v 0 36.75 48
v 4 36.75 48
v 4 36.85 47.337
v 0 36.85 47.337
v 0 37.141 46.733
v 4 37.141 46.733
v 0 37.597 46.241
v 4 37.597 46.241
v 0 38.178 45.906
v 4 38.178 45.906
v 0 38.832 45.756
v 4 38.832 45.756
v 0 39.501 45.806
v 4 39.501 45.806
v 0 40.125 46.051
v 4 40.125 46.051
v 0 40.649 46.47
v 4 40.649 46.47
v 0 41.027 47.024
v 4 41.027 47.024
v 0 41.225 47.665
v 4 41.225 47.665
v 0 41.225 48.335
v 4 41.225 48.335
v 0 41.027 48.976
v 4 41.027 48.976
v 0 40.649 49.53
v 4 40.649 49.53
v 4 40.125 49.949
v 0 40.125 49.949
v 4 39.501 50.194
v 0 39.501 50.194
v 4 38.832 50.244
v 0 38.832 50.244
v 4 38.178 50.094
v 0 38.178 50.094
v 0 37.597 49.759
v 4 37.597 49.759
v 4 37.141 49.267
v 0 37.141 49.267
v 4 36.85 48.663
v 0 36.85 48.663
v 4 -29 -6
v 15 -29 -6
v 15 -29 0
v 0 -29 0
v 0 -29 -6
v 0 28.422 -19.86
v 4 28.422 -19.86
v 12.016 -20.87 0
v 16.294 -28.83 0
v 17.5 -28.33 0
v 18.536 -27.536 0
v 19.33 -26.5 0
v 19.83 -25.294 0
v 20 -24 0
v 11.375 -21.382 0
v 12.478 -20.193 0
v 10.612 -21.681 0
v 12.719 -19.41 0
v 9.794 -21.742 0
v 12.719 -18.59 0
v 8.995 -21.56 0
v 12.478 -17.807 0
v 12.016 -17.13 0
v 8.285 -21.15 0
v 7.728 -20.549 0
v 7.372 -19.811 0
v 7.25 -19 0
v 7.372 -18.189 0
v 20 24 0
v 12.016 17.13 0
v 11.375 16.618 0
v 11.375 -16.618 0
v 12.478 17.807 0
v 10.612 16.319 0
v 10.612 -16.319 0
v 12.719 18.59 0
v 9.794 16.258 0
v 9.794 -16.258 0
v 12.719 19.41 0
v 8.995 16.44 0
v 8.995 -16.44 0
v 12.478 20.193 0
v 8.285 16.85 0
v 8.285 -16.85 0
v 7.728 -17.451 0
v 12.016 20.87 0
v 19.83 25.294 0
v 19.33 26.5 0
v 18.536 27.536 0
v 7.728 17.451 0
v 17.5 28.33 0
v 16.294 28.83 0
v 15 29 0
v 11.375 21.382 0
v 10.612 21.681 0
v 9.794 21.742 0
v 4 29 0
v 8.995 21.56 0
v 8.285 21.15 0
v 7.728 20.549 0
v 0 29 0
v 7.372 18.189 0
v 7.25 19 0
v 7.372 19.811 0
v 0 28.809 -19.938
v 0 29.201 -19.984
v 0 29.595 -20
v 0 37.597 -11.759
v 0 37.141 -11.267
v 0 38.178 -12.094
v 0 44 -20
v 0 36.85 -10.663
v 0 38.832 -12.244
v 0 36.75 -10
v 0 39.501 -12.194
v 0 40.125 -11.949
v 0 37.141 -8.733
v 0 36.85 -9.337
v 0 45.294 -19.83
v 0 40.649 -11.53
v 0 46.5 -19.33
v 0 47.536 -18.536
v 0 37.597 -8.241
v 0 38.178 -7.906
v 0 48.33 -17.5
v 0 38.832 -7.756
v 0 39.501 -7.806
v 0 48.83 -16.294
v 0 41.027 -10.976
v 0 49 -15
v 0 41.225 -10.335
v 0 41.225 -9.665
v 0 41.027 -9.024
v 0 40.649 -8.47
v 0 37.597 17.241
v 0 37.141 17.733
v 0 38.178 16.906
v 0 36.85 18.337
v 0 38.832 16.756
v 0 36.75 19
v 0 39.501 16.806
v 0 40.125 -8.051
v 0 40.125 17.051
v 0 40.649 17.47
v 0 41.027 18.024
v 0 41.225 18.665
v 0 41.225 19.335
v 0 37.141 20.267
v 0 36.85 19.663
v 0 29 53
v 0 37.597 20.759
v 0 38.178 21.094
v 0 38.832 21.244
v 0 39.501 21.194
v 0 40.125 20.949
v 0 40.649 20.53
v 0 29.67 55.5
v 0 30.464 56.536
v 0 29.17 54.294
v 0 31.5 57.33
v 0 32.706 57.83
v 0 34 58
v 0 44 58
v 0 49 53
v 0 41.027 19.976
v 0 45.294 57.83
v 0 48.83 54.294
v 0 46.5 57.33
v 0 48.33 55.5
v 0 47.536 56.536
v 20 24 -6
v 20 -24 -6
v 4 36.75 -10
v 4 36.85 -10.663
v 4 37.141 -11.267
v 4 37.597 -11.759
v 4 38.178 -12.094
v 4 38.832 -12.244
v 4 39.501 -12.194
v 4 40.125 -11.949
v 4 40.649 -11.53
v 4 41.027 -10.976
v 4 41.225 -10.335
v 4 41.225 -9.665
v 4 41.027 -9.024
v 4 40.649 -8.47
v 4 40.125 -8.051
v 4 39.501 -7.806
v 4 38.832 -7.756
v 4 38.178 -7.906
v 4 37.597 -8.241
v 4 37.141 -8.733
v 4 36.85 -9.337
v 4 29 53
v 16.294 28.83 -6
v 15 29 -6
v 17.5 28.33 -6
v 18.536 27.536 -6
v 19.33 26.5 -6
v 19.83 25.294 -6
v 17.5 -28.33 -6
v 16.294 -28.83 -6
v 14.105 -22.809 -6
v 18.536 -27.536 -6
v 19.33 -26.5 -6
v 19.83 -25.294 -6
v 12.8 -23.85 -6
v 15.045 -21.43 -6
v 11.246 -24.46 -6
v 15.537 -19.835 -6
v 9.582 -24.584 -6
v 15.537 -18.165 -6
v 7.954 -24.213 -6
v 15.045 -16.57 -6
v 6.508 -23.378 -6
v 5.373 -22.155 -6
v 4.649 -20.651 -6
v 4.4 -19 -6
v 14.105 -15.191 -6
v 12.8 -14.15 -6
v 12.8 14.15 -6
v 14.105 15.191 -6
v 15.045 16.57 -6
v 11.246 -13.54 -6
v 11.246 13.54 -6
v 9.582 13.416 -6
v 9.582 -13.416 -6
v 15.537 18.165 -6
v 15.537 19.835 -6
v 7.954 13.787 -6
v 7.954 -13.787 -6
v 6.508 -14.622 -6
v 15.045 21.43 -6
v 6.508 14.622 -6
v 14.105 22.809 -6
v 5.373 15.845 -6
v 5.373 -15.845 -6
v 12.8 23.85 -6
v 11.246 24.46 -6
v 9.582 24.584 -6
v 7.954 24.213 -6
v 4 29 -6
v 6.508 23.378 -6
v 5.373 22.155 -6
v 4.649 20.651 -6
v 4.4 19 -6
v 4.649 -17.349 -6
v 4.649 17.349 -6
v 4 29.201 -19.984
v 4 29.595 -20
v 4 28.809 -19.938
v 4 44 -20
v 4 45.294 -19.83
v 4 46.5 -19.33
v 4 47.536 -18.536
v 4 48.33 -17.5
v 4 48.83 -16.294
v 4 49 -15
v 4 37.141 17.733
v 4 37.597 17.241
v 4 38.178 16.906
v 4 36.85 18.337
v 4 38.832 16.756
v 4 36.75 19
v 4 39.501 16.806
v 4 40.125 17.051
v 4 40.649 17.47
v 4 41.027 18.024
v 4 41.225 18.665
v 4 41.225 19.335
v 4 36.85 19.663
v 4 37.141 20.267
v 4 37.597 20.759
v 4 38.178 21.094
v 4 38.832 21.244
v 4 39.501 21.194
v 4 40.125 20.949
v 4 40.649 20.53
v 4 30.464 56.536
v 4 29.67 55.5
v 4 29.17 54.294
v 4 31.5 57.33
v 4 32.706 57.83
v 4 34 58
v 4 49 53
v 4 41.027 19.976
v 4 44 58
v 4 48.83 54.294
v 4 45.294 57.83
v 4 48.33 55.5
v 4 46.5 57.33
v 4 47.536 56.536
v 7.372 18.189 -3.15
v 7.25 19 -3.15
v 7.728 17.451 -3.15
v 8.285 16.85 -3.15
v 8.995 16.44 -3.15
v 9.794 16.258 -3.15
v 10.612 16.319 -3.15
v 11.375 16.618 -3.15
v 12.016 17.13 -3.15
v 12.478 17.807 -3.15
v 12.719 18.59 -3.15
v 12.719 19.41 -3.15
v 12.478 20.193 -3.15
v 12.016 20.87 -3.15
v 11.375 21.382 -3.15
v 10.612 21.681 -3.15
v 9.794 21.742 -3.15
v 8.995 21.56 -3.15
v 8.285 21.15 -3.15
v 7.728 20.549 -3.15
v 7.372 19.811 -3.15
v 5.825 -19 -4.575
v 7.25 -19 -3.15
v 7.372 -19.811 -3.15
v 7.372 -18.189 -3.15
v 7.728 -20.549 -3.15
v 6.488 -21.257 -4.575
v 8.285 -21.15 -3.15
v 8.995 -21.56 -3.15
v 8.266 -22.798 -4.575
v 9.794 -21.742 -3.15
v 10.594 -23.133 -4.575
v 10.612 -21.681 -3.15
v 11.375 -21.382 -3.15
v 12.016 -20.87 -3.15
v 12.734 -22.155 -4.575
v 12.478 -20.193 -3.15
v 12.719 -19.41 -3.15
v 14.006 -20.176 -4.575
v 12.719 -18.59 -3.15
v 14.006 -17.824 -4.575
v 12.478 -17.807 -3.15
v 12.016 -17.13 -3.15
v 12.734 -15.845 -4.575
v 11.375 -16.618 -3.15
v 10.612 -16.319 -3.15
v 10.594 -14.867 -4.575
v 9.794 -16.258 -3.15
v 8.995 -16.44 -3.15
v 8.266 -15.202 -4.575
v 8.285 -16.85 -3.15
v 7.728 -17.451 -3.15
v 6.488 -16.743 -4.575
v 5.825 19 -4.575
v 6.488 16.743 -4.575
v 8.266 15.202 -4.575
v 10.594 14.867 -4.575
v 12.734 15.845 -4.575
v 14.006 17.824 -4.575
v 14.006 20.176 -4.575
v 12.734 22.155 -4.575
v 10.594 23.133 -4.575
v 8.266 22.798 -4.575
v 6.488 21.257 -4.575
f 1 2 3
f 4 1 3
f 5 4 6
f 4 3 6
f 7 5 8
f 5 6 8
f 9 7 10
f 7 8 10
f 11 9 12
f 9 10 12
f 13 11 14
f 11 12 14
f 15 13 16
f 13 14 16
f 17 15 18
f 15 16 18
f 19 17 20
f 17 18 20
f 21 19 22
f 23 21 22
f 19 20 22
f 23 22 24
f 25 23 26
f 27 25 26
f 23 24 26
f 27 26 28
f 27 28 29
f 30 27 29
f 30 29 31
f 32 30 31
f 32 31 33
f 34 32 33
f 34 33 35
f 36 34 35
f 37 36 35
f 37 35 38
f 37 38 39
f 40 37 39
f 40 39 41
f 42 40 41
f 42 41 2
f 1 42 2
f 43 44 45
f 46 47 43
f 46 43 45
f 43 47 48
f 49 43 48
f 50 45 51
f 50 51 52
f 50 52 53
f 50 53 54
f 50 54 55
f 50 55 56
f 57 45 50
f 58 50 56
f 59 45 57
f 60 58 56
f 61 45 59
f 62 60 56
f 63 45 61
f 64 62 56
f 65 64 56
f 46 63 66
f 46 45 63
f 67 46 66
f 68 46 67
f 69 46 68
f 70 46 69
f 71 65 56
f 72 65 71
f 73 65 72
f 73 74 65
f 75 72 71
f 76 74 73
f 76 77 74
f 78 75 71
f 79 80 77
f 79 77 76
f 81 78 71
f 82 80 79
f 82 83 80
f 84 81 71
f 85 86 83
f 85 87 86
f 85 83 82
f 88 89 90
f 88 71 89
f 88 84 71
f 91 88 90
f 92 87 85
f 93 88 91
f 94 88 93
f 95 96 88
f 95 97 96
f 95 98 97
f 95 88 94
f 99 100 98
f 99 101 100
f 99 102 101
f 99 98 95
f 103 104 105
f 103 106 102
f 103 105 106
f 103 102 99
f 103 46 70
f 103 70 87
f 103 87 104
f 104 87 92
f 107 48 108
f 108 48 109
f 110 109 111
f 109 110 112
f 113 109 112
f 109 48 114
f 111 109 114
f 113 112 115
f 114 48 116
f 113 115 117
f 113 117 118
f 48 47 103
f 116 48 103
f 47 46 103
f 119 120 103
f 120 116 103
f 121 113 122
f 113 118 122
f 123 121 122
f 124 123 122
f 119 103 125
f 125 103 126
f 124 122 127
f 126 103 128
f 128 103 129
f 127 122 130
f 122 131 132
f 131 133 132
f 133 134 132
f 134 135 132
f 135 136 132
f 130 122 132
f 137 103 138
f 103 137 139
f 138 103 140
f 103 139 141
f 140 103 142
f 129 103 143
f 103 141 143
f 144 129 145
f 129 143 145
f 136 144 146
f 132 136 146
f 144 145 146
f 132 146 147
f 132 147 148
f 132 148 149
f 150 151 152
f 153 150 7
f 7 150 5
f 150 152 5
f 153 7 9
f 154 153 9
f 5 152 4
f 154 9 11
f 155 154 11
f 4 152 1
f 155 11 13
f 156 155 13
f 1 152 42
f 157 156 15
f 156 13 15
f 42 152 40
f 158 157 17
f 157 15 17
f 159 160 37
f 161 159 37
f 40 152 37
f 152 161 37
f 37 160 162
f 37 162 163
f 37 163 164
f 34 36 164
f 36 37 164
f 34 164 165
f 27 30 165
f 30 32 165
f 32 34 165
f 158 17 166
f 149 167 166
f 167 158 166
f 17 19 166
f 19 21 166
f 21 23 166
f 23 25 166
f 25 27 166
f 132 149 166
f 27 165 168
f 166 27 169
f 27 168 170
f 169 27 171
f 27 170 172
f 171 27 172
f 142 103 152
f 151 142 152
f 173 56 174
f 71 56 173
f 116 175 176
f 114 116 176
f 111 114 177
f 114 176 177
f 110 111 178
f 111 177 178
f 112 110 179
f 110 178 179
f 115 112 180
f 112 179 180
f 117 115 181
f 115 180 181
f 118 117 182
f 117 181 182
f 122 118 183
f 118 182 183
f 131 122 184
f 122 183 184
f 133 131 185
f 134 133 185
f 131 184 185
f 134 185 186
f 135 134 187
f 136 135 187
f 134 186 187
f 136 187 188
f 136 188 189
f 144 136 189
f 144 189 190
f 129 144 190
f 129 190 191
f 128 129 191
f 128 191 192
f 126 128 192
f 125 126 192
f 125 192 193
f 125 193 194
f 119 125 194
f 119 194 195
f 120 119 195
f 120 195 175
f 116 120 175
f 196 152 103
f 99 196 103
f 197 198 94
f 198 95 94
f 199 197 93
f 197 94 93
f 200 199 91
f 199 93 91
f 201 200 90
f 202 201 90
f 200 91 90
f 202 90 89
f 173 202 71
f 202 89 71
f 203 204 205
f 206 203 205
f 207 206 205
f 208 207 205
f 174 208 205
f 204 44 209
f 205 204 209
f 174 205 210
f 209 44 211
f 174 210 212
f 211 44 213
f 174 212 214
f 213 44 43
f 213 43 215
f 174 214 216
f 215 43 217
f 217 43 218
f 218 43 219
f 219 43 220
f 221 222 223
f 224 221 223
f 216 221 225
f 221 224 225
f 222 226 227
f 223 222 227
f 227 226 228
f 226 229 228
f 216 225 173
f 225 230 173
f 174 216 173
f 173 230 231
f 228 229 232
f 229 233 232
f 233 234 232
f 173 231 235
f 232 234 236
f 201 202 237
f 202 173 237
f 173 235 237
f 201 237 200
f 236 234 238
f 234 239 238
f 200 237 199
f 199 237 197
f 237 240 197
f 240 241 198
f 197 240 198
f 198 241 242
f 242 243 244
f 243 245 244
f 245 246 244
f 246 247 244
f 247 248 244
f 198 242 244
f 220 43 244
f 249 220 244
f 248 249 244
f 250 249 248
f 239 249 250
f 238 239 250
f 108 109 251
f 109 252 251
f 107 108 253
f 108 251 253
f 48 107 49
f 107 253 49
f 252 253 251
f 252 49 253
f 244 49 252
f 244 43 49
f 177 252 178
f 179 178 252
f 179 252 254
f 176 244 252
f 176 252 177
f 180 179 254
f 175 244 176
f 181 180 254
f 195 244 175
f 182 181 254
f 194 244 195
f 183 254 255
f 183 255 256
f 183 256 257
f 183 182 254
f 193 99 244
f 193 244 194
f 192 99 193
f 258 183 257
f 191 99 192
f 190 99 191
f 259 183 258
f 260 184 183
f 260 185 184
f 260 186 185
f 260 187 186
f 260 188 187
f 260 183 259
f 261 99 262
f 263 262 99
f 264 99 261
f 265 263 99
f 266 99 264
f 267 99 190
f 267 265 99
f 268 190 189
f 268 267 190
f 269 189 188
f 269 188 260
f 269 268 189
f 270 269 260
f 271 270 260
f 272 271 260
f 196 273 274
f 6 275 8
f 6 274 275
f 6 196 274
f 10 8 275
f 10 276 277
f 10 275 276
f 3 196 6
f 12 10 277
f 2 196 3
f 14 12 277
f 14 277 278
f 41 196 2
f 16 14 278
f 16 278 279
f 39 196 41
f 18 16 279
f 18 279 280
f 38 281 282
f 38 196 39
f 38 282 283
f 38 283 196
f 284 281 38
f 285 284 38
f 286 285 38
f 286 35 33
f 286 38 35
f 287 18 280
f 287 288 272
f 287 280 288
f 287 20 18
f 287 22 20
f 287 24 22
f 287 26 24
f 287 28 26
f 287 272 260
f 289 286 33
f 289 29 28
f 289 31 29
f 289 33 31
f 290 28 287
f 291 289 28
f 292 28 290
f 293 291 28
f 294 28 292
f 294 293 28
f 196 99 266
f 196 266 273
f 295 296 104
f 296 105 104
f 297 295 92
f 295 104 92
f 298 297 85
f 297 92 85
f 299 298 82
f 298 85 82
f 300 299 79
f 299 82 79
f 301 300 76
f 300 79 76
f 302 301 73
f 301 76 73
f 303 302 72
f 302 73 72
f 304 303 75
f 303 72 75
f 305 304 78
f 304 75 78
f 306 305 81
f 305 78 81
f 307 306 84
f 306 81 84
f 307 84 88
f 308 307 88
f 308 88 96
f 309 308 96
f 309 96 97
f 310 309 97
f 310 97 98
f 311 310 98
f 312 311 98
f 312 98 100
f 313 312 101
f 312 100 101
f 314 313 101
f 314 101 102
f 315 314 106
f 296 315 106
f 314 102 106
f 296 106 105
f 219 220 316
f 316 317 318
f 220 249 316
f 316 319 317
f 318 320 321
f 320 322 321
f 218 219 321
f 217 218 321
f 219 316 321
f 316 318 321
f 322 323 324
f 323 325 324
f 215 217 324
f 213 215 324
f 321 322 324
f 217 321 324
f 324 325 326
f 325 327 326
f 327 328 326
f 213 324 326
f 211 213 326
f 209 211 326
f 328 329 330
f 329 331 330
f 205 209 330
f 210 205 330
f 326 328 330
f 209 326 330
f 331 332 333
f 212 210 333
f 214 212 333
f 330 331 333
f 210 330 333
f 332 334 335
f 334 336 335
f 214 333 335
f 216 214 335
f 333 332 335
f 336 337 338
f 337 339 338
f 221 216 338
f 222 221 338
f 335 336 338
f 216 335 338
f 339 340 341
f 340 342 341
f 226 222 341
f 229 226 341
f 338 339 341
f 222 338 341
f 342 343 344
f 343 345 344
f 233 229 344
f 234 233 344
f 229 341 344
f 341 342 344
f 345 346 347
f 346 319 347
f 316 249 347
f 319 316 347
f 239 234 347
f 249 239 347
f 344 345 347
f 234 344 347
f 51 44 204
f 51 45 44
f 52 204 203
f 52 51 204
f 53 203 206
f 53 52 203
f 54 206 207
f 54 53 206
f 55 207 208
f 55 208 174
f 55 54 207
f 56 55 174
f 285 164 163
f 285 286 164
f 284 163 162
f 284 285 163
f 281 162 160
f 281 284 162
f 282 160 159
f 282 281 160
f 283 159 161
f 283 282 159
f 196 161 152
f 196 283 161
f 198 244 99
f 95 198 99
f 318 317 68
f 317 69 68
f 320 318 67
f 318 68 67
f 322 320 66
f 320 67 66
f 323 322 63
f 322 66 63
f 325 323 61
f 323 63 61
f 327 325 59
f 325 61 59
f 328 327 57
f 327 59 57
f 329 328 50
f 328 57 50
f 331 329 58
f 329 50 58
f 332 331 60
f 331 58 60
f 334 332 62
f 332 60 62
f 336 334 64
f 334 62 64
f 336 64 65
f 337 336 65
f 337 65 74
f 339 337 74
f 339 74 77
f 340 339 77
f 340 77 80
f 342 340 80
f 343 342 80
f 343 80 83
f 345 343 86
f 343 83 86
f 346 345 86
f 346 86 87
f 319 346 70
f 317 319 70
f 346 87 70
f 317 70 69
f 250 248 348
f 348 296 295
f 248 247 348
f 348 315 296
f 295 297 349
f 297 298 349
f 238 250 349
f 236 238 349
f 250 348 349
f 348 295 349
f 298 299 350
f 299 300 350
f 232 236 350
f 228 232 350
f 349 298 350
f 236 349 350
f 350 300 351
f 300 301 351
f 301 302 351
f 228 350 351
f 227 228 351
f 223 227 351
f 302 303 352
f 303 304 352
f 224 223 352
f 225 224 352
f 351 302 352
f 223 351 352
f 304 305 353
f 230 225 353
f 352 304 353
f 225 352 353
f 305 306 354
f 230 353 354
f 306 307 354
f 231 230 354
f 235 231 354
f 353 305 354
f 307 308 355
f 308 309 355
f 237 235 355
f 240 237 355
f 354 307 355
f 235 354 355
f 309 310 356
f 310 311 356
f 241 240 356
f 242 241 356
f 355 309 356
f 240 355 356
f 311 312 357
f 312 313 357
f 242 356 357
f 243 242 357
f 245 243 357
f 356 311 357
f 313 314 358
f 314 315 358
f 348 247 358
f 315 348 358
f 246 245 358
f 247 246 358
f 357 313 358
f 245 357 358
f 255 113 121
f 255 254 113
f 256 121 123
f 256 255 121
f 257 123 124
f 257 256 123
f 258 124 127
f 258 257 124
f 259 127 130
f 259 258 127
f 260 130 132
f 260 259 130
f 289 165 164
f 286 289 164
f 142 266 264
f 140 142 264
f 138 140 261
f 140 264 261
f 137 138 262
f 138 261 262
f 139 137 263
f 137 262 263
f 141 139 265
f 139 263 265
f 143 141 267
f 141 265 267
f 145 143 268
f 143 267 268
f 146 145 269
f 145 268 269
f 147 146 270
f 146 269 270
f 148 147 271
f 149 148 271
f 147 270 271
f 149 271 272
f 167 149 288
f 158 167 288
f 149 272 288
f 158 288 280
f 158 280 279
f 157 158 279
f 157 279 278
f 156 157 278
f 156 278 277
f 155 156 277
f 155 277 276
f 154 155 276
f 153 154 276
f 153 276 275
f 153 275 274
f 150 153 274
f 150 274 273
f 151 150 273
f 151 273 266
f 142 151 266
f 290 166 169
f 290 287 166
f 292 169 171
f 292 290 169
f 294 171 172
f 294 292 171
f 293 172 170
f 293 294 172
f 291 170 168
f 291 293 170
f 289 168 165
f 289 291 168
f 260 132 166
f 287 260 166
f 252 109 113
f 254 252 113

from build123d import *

# Parameters (mm, degrees)
F0_W           = 58
F0_H           = 6
F2_DEPTH       = 20
F3_DEPTH       = 4
F5_D           = 5.5
F5_DEPTH       = 15
F5_CSINK_D     = 11.2
F5_CSINK_ANGLE = 90
F5_TIP         = 1.6523667023
F6_R           = 5
F7_D           = 4.5
F7_DEPTH       = 15
F7_TIP         = 1.3519363928


with BuildPart() as f2:
    # F0 (on Right) → F2 (new body)
    with BuildSketch(Plane.YZ):
        with Locations((0, -3)):
            Rectangle(F0_W, F0_H)
    extrude(amount=F2_DEPTH)

    # F1 (on Right) → F3 (join)
    with BuildSketch(Plane.YZ):
        Polygon((-29, 0), (-29, -6), (29, -20), (49, -20), (49, 58), (29, 58), (29, 0), align=None)
    extrude(amount=F3_DEPTH)

    # F5
    with Locations(Plane(origin=(0, 0, -6), x_dir=(1, 0, 0), z_dir=(0, 0, -1))):
        with Locations((10, -19), (10, 19)):
            CounterSinkHole(F5_D / 2, F5_CSINK_D / 2, depth=F5_DEPTH, counter_sink_angle=F5_CSINK_ANGLE)
            with Locations((0, 0, -(F5_DEPTH + F5_TIP / 2))):  # 118° drill point
                Cone(0, F5_D / 2, F5_TIP, mode=Mode.SUBTRACT)

    # F6
    f6_edges = [f2.edges().sort_by_distance(p)[0] for p in [
        (20, -29, -3),
        (20, 29, -3),
        (2, 29, 58),
        (2, 49, 58),
        (2, 49, -20),
        (2, 29, -20),
    ]]
    fillet(f6_edges, radius=F6_R)

    # F7
    with Locations(Plane(origin=(0, 0, 0), x_dir=(0, 1, 0), z_dir=(-1, 0, 0))):
        with Locations((39, -48), (39, -19), (39, 10)):
            Hole(F7_D / 2, depth=F7_DEPTH)
            with Locations((0, 0, -(F7_DEPTH + F7_TIP / 2))):  # 118° drill point
                Cone(0, F7_D / 2, F7_TIP, mode=Mode.SUBTRACT)


solid = f2.part
